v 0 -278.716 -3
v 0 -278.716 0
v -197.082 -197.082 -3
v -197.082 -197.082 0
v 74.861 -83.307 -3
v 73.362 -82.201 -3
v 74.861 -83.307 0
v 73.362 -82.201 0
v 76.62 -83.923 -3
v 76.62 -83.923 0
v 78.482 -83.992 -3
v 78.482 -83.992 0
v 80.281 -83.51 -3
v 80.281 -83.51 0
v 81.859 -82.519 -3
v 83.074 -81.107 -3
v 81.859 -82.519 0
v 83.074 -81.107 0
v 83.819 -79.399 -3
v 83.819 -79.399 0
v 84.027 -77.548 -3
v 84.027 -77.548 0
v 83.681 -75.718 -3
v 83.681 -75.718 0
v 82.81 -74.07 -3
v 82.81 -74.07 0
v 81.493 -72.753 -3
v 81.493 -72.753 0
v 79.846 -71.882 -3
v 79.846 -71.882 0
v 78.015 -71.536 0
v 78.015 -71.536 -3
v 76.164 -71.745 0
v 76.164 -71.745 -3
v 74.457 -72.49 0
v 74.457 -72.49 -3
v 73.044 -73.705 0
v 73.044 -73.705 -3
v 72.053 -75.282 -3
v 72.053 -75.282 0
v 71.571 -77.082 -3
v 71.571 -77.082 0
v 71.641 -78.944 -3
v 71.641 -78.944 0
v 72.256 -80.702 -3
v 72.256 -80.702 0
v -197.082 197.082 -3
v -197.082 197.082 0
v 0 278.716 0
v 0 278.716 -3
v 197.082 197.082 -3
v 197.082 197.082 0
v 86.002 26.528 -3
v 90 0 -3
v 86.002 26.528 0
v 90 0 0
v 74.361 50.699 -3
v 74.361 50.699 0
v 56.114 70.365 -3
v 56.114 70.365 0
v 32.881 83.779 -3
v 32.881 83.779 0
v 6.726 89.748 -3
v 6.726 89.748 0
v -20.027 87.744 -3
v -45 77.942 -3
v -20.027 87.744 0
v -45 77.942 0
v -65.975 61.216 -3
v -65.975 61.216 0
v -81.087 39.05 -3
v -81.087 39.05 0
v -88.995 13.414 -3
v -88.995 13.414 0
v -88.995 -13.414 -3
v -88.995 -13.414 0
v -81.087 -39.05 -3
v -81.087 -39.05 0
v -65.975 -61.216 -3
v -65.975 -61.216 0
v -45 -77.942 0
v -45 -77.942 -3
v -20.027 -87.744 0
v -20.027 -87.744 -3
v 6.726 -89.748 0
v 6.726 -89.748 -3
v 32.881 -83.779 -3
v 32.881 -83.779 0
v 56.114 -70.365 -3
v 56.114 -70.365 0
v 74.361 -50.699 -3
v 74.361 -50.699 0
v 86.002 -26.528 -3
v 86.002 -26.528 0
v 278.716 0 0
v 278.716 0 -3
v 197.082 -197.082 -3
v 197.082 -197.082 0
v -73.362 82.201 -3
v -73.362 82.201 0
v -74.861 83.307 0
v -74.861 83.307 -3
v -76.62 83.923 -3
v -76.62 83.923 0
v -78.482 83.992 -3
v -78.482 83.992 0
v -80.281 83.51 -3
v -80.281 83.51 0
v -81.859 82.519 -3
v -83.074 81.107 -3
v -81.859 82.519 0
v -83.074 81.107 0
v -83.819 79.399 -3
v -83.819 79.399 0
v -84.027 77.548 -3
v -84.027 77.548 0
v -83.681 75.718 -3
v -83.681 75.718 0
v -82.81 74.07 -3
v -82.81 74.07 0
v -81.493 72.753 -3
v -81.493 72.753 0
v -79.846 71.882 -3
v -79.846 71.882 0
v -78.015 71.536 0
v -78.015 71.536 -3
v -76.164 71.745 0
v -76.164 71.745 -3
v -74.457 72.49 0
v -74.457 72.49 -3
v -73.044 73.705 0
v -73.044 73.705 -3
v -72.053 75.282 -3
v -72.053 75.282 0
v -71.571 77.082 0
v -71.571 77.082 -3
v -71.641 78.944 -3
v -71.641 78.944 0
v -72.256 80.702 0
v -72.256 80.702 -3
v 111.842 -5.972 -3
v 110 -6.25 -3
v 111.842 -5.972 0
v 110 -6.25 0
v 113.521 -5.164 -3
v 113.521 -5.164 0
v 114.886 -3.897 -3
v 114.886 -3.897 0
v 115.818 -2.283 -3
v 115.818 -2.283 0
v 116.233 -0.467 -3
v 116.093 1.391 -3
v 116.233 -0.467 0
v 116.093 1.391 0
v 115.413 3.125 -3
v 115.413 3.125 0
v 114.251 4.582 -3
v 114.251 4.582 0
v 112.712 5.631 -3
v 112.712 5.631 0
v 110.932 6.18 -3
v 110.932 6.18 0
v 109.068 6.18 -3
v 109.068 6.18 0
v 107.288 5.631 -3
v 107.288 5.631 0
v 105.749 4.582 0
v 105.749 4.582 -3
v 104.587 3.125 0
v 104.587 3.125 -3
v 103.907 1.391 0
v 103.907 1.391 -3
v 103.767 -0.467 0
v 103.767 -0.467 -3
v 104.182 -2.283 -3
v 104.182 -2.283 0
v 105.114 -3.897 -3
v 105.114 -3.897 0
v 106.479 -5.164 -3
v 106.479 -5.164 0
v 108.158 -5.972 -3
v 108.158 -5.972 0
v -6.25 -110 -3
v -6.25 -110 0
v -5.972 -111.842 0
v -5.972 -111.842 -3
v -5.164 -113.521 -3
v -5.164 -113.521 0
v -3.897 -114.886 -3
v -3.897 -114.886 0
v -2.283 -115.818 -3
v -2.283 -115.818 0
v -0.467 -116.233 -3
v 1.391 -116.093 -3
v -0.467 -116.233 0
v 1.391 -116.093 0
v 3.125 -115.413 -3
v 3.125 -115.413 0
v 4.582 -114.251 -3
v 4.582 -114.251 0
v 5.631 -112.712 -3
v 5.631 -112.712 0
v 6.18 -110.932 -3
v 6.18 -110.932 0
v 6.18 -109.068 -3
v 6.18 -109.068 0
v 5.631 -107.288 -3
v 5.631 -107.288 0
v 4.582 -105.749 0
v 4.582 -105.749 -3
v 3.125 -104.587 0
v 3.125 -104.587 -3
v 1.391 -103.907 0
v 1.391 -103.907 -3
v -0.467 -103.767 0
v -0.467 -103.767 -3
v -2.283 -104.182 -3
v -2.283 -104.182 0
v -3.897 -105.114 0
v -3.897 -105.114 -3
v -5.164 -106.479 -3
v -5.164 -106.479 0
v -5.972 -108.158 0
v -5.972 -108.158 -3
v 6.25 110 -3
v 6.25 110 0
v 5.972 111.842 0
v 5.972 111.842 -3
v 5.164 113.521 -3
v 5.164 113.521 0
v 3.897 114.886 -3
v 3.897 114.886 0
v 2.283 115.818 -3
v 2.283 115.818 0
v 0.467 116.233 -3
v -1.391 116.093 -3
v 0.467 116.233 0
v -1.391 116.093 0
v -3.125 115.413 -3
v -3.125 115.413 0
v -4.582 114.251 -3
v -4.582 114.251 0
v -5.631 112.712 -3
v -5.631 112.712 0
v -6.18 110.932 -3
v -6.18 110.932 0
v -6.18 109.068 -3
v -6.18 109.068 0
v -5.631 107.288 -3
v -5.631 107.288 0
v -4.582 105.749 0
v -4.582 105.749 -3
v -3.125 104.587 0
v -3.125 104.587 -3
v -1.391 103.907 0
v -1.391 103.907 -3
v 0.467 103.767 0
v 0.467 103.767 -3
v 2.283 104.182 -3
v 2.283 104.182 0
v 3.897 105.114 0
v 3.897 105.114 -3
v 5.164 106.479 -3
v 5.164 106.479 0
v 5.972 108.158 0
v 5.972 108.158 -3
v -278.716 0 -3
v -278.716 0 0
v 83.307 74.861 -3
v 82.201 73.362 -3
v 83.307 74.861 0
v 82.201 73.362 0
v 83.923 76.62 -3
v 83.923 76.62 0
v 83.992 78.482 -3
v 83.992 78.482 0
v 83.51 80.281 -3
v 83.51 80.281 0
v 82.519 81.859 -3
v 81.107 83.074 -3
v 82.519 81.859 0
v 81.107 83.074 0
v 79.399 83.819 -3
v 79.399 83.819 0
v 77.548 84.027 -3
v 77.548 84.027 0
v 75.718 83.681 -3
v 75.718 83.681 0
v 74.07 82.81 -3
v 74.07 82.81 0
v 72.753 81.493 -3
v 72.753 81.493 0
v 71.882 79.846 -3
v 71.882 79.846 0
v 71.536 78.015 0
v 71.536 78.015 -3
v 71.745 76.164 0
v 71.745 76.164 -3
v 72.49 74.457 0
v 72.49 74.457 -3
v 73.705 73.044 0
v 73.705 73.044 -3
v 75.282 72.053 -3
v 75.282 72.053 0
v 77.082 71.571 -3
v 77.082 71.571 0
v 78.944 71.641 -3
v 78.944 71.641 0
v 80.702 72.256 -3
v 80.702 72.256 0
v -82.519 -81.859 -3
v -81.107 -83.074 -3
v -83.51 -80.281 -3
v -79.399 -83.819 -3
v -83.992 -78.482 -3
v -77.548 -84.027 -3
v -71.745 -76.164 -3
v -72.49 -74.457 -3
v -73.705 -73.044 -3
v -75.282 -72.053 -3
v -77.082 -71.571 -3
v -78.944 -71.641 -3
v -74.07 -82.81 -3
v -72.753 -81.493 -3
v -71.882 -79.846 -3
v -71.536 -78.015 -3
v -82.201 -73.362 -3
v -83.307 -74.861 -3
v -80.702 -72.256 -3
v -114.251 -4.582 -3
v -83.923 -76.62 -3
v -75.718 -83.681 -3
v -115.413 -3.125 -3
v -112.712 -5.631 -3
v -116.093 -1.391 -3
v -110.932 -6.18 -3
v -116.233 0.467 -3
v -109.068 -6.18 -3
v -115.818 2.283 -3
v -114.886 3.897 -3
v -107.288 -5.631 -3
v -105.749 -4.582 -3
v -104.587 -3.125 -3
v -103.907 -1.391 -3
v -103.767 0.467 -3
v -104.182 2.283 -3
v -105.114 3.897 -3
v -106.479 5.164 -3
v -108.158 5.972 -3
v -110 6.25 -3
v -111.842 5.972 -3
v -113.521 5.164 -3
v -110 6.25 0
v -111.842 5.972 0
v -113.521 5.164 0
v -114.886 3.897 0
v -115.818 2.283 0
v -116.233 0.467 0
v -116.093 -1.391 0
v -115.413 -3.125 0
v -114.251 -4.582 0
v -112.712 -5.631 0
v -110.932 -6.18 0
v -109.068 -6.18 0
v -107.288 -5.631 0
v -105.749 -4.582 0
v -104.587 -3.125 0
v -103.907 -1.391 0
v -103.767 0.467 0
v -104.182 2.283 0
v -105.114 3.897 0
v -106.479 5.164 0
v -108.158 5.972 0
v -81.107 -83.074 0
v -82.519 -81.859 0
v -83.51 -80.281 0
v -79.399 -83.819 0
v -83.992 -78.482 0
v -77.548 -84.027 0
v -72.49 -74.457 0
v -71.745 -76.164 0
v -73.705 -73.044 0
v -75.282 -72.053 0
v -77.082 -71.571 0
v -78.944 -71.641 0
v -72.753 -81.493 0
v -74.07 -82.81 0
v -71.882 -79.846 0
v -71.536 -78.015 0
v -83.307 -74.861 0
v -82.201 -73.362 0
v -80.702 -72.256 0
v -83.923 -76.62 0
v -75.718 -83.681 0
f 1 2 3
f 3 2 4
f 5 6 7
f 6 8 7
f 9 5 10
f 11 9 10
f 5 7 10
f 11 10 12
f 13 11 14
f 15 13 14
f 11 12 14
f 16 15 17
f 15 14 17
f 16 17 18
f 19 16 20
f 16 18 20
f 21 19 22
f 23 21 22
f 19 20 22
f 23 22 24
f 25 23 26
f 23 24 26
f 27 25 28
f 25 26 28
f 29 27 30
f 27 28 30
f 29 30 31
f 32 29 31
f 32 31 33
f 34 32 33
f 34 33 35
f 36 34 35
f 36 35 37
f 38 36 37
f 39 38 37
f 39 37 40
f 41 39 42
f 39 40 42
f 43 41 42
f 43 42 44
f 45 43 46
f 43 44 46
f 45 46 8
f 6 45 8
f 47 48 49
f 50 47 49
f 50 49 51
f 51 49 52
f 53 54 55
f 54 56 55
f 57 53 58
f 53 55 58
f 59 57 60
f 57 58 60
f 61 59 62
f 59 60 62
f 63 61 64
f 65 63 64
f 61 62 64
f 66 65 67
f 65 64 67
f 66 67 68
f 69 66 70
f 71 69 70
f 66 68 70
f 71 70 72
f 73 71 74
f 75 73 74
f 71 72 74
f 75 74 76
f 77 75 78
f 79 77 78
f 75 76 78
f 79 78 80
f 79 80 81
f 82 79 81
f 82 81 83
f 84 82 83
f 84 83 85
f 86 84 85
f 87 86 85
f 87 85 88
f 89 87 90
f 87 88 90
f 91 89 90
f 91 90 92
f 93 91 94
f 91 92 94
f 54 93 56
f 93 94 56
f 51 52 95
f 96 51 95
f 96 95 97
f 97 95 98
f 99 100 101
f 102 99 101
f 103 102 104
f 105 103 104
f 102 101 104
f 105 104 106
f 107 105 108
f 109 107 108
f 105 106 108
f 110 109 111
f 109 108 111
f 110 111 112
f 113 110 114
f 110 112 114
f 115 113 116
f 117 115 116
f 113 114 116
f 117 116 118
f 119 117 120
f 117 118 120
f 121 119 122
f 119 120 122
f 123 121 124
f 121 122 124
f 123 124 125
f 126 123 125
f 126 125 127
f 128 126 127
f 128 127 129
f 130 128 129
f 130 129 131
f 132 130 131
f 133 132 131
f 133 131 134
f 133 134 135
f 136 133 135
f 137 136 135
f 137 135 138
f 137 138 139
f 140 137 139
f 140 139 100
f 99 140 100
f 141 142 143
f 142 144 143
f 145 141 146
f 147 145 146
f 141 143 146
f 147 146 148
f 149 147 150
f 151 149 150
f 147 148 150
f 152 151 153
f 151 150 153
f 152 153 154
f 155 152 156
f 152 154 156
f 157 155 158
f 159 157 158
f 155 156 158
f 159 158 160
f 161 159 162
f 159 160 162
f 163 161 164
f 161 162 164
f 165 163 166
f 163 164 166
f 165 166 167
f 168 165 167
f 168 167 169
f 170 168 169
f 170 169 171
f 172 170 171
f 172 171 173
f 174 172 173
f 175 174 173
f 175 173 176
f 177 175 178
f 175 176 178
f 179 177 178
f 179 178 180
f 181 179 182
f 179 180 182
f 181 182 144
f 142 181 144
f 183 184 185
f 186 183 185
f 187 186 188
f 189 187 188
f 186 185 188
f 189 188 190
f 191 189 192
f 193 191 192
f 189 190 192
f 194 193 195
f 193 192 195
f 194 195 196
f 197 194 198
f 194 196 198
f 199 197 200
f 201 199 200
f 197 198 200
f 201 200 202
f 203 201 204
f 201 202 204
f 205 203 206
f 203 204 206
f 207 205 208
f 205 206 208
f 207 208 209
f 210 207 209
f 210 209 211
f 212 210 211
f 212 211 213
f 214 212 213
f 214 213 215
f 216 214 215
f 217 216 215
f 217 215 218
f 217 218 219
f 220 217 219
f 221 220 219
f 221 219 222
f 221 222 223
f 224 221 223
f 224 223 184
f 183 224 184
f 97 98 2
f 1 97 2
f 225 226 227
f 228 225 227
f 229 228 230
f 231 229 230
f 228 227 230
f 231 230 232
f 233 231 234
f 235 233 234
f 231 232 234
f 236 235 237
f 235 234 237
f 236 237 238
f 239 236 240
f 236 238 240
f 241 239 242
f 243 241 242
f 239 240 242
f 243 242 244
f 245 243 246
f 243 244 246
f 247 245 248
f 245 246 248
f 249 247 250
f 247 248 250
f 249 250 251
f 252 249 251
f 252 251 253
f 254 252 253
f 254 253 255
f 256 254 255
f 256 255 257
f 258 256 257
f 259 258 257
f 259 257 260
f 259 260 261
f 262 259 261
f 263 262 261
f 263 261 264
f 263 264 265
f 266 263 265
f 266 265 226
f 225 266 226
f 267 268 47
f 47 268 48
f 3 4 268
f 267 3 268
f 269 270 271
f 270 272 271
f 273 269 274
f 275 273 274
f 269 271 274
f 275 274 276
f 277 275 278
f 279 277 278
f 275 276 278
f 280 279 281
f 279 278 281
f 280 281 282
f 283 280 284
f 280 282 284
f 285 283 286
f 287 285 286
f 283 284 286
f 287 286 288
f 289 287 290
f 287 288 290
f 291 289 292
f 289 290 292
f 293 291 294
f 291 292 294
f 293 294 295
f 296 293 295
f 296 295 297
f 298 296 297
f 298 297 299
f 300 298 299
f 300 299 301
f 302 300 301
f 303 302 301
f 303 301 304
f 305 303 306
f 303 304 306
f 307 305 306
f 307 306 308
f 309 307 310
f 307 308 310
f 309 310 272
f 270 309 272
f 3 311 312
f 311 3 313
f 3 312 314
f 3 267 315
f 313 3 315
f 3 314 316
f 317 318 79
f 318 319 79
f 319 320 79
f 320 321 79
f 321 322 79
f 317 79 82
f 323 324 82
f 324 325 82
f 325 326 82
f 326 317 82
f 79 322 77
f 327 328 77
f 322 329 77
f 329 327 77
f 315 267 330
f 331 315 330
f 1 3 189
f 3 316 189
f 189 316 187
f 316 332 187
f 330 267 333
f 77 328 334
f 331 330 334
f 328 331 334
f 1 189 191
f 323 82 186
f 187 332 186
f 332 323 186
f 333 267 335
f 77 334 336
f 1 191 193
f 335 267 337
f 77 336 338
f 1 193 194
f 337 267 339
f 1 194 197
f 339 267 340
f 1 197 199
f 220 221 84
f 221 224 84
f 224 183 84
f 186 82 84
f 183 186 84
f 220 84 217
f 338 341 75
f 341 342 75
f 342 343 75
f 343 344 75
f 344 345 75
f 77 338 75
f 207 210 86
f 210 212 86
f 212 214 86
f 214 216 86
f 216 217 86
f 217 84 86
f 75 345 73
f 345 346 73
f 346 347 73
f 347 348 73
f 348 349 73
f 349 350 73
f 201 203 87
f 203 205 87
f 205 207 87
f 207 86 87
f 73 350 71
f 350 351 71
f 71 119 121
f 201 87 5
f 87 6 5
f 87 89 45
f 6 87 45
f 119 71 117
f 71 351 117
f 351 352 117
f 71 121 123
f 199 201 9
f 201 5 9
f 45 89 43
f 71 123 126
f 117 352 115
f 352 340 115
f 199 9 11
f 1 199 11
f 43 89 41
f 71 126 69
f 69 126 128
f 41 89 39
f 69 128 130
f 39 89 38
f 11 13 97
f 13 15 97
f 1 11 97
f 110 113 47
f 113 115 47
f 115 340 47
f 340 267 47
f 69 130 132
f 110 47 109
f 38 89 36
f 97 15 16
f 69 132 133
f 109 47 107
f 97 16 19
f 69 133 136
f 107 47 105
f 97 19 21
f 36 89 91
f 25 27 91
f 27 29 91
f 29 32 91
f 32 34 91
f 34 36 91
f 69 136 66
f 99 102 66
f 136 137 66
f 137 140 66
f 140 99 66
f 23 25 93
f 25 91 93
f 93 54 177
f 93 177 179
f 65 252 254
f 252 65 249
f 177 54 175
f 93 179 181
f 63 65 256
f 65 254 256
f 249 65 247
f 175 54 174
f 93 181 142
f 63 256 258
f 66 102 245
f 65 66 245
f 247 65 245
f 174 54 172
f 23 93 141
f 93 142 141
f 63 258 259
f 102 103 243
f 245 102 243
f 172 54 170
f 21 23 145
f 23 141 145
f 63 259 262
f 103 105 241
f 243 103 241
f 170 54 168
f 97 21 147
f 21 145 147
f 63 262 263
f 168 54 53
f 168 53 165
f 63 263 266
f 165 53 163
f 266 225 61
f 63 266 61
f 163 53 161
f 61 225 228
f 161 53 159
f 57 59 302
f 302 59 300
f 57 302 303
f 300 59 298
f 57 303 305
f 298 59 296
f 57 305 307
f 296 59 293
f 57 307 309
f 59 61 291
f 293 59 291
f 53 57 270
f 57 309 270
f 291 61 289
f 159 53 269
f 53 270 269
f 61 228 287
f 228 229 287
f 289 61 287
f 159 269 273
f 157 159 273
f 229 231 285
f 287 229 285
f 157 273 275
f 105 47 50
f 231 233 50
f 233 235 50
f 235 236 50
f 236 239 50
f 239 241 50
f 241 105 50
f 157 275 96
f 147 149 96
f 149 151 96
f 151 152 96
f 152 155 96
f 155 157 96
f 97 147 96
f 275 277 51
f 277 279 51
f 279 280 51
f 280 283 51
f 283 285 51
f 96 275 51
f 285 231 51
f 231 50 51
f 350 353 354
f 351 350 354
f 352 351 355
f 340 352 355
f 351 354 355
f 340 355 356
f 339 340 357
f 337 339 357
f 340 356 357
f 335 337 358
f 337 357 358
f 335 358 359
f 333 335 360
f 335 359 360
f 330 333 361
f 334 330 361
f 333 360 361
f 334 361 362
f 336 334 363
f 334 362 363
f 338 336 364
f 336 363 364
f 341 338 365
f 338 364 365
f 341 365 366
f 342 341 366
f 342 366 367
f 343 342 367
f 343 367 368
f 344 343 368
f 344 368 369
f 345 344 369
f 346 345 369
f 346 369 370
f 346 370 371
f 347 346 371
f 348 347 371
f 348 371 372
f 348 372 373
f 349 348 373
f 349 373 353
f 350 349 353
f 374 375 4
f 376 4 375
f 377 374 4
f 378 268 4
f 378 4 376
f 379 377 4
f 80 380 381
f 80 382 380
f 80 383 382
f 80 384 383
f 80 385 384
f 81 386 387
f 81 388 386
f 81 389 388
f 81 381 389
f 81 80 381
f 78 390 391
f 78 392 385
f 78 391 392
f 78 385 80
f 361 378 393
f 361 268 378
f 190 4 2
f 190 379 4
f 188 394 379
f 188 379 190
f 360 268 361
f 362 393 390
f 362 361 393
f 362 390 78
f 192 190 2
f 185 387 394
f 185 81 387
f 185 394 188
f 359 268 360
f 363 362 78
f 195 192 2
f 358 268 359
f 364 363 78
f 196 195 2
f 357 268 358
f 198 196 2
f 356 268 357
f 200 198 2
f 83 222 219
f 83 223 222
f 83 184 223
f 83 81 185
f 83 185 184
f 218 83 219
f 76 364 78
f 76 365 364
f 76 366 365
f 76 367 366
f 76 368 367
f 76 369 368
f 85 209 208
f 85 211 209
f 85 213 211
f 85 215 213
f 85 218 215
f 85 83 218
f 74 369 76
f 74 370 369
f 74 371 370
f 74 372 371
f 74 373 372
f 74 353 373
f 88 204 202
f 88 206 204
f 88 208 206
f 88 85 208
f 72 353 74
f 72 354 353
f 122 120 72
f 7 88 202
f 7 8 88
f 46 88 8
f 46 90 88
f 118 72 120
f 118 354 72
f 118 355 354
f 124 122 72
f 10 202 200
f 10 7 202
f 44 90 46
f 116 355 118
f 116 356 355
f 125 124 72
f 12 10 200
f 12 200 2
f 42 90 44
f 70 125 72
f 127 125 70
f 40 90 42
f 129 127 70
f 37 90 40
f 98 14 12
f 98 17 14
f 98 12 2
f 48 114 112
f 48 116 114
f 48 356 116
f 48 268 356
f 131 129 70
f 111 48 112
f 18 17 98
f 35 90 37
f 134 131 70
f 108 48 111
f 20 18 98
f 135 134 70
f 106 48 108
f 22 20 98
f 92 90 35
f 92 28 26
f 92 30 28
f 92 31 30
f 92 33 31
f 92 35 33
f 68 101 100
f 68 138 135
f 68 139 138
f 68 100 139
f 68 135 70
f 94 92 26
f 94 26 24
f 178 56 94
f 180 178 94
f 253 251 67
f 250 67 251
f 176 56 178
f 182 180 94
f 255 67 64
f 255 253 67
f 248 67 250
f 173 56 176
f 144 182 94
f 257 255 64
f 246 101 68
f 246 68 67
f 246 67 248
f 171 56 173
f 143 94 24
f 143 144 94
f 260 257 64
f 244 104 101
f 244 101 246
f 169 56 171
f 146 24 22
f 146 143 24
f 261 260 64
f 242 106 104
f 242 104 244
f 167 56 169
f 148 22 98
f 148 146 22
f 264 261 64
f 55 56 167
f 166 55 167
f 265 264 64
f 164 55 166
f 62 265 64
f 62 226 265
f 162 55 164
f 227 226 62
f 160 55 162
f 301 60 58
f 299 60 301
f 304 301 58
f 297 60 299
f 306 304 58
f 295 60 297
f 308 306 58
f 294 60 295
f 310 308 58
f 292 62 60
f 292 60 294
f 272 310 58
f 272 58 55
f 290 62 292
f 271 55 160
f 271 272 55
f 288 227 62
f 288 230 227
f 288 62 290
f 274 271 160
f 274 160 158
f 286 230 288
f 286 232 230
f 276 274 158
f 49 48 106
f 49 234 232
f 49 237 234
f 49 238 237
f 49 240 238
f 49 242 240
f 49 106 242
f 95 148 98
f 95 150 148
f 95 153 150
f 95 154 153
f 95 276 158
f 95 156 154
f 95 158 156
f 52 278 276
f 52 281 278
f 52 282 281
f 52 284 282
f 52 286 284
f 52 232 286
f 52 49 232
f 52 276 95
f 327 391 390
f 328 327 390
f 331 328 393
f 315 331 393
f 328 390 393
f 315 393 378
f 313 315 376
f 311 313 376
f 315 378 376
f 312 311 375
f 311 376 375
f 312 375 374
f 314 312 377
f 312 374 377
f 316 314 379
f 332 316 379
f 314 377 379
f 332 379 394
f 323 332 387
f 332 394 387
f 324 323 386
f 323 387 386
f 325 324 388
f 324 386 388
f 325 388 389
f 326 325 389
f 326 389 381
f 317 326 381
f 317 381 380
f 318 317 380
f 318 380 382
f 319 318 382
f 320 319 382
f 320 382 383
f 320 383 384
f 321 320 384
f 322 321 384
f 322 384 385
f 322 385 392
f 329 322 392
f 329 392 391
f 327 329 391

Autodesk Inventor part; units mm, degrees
ref_plane "YZ Plane" through (0, 0, 0) normal (1, 0, 0) x (0, 1, 0)
ref_plane "XZ Plane" through (0, 0, 0) normal (0, 1, 0) x (-1, 0, 0)
ref_plane "XY Plane" through (0, 0, 0) normal (0, 0, 1) x (1, 0, 0)
sketch "Sketch2" plane through (0, 0, 0) normal (0, 0, 1) x (1, 0, 0)
  line L0 (-197.082, 197.082) -> (0, 278.716)
  line L1 (0, 278.716) -> (197.082, 197.082)
  line L2 (197.082, 197.082) -> (278.716, 0)
  line L3 (278.716, 0) -> (197.082, -197.082)
  line L4 (197.082, -197.082) -> (0, -278.716)
  line L5 (0, -278.716) -> (-197.082, -197.082)
  line L6 (-197.082, -197.082) -> (-278.716, 0)
  line L7 (-278.716, 0) -> (-197.082, 197.082)
  circle A0 centre (0, 0) radius 90
  dimension "d23" = 515
  dimension "d26" = 180
extrude "Plate1" add sketch "Sketch2" against normal blind 3
sketch "Sketch4" plane through (0, 0, 0) normal (0, 0, 1) x (1, 0, 0)
  circle A0 centre (0, 110) radius 6.25
  circle A1 centre (0, 0) radius 90 projected
  circle A2 centre (0, 0) radius 110 construction
  dimension "d28" = 220
  dimension "d16" = 12.5
extrude "Extrusion1" cut sketch "Sketch4" against normal up to surface (3 mm away) contours A0
pattern_circular "Circular Pattern1" count 8 over 360 about axis through (0, 0, -10) along (0, 0, 1) of "Extrusion1"
equation "\"d23\" = Барабан_размер_по_плоскостям"
equation "\"d15\" = Thickness"
equation "\"BendRadius\" = Thickness"
equation "\"BendReliefWidth\" = Thickness"
equation "\"BendReliefDepth\" = 0.5 * Thickness"
equation "\"CornerReliefSize\" = 4 * Thickness"
equation "\"MinimumRemnant\" = 2 * Thickness"
equation "\"TransitionRadius\" = BendRadius"
equation "\"JacobiRadiusSize\" = BendRadius"
equation "\"GapSize\" = Thickness"
equation "\"Барабан_размер_по_плоскостям\" = 515"
equation "\"Thickness\" = 3"
properties part number "DMF 01 21 Барабан торец НОС v2.1_наруж"
